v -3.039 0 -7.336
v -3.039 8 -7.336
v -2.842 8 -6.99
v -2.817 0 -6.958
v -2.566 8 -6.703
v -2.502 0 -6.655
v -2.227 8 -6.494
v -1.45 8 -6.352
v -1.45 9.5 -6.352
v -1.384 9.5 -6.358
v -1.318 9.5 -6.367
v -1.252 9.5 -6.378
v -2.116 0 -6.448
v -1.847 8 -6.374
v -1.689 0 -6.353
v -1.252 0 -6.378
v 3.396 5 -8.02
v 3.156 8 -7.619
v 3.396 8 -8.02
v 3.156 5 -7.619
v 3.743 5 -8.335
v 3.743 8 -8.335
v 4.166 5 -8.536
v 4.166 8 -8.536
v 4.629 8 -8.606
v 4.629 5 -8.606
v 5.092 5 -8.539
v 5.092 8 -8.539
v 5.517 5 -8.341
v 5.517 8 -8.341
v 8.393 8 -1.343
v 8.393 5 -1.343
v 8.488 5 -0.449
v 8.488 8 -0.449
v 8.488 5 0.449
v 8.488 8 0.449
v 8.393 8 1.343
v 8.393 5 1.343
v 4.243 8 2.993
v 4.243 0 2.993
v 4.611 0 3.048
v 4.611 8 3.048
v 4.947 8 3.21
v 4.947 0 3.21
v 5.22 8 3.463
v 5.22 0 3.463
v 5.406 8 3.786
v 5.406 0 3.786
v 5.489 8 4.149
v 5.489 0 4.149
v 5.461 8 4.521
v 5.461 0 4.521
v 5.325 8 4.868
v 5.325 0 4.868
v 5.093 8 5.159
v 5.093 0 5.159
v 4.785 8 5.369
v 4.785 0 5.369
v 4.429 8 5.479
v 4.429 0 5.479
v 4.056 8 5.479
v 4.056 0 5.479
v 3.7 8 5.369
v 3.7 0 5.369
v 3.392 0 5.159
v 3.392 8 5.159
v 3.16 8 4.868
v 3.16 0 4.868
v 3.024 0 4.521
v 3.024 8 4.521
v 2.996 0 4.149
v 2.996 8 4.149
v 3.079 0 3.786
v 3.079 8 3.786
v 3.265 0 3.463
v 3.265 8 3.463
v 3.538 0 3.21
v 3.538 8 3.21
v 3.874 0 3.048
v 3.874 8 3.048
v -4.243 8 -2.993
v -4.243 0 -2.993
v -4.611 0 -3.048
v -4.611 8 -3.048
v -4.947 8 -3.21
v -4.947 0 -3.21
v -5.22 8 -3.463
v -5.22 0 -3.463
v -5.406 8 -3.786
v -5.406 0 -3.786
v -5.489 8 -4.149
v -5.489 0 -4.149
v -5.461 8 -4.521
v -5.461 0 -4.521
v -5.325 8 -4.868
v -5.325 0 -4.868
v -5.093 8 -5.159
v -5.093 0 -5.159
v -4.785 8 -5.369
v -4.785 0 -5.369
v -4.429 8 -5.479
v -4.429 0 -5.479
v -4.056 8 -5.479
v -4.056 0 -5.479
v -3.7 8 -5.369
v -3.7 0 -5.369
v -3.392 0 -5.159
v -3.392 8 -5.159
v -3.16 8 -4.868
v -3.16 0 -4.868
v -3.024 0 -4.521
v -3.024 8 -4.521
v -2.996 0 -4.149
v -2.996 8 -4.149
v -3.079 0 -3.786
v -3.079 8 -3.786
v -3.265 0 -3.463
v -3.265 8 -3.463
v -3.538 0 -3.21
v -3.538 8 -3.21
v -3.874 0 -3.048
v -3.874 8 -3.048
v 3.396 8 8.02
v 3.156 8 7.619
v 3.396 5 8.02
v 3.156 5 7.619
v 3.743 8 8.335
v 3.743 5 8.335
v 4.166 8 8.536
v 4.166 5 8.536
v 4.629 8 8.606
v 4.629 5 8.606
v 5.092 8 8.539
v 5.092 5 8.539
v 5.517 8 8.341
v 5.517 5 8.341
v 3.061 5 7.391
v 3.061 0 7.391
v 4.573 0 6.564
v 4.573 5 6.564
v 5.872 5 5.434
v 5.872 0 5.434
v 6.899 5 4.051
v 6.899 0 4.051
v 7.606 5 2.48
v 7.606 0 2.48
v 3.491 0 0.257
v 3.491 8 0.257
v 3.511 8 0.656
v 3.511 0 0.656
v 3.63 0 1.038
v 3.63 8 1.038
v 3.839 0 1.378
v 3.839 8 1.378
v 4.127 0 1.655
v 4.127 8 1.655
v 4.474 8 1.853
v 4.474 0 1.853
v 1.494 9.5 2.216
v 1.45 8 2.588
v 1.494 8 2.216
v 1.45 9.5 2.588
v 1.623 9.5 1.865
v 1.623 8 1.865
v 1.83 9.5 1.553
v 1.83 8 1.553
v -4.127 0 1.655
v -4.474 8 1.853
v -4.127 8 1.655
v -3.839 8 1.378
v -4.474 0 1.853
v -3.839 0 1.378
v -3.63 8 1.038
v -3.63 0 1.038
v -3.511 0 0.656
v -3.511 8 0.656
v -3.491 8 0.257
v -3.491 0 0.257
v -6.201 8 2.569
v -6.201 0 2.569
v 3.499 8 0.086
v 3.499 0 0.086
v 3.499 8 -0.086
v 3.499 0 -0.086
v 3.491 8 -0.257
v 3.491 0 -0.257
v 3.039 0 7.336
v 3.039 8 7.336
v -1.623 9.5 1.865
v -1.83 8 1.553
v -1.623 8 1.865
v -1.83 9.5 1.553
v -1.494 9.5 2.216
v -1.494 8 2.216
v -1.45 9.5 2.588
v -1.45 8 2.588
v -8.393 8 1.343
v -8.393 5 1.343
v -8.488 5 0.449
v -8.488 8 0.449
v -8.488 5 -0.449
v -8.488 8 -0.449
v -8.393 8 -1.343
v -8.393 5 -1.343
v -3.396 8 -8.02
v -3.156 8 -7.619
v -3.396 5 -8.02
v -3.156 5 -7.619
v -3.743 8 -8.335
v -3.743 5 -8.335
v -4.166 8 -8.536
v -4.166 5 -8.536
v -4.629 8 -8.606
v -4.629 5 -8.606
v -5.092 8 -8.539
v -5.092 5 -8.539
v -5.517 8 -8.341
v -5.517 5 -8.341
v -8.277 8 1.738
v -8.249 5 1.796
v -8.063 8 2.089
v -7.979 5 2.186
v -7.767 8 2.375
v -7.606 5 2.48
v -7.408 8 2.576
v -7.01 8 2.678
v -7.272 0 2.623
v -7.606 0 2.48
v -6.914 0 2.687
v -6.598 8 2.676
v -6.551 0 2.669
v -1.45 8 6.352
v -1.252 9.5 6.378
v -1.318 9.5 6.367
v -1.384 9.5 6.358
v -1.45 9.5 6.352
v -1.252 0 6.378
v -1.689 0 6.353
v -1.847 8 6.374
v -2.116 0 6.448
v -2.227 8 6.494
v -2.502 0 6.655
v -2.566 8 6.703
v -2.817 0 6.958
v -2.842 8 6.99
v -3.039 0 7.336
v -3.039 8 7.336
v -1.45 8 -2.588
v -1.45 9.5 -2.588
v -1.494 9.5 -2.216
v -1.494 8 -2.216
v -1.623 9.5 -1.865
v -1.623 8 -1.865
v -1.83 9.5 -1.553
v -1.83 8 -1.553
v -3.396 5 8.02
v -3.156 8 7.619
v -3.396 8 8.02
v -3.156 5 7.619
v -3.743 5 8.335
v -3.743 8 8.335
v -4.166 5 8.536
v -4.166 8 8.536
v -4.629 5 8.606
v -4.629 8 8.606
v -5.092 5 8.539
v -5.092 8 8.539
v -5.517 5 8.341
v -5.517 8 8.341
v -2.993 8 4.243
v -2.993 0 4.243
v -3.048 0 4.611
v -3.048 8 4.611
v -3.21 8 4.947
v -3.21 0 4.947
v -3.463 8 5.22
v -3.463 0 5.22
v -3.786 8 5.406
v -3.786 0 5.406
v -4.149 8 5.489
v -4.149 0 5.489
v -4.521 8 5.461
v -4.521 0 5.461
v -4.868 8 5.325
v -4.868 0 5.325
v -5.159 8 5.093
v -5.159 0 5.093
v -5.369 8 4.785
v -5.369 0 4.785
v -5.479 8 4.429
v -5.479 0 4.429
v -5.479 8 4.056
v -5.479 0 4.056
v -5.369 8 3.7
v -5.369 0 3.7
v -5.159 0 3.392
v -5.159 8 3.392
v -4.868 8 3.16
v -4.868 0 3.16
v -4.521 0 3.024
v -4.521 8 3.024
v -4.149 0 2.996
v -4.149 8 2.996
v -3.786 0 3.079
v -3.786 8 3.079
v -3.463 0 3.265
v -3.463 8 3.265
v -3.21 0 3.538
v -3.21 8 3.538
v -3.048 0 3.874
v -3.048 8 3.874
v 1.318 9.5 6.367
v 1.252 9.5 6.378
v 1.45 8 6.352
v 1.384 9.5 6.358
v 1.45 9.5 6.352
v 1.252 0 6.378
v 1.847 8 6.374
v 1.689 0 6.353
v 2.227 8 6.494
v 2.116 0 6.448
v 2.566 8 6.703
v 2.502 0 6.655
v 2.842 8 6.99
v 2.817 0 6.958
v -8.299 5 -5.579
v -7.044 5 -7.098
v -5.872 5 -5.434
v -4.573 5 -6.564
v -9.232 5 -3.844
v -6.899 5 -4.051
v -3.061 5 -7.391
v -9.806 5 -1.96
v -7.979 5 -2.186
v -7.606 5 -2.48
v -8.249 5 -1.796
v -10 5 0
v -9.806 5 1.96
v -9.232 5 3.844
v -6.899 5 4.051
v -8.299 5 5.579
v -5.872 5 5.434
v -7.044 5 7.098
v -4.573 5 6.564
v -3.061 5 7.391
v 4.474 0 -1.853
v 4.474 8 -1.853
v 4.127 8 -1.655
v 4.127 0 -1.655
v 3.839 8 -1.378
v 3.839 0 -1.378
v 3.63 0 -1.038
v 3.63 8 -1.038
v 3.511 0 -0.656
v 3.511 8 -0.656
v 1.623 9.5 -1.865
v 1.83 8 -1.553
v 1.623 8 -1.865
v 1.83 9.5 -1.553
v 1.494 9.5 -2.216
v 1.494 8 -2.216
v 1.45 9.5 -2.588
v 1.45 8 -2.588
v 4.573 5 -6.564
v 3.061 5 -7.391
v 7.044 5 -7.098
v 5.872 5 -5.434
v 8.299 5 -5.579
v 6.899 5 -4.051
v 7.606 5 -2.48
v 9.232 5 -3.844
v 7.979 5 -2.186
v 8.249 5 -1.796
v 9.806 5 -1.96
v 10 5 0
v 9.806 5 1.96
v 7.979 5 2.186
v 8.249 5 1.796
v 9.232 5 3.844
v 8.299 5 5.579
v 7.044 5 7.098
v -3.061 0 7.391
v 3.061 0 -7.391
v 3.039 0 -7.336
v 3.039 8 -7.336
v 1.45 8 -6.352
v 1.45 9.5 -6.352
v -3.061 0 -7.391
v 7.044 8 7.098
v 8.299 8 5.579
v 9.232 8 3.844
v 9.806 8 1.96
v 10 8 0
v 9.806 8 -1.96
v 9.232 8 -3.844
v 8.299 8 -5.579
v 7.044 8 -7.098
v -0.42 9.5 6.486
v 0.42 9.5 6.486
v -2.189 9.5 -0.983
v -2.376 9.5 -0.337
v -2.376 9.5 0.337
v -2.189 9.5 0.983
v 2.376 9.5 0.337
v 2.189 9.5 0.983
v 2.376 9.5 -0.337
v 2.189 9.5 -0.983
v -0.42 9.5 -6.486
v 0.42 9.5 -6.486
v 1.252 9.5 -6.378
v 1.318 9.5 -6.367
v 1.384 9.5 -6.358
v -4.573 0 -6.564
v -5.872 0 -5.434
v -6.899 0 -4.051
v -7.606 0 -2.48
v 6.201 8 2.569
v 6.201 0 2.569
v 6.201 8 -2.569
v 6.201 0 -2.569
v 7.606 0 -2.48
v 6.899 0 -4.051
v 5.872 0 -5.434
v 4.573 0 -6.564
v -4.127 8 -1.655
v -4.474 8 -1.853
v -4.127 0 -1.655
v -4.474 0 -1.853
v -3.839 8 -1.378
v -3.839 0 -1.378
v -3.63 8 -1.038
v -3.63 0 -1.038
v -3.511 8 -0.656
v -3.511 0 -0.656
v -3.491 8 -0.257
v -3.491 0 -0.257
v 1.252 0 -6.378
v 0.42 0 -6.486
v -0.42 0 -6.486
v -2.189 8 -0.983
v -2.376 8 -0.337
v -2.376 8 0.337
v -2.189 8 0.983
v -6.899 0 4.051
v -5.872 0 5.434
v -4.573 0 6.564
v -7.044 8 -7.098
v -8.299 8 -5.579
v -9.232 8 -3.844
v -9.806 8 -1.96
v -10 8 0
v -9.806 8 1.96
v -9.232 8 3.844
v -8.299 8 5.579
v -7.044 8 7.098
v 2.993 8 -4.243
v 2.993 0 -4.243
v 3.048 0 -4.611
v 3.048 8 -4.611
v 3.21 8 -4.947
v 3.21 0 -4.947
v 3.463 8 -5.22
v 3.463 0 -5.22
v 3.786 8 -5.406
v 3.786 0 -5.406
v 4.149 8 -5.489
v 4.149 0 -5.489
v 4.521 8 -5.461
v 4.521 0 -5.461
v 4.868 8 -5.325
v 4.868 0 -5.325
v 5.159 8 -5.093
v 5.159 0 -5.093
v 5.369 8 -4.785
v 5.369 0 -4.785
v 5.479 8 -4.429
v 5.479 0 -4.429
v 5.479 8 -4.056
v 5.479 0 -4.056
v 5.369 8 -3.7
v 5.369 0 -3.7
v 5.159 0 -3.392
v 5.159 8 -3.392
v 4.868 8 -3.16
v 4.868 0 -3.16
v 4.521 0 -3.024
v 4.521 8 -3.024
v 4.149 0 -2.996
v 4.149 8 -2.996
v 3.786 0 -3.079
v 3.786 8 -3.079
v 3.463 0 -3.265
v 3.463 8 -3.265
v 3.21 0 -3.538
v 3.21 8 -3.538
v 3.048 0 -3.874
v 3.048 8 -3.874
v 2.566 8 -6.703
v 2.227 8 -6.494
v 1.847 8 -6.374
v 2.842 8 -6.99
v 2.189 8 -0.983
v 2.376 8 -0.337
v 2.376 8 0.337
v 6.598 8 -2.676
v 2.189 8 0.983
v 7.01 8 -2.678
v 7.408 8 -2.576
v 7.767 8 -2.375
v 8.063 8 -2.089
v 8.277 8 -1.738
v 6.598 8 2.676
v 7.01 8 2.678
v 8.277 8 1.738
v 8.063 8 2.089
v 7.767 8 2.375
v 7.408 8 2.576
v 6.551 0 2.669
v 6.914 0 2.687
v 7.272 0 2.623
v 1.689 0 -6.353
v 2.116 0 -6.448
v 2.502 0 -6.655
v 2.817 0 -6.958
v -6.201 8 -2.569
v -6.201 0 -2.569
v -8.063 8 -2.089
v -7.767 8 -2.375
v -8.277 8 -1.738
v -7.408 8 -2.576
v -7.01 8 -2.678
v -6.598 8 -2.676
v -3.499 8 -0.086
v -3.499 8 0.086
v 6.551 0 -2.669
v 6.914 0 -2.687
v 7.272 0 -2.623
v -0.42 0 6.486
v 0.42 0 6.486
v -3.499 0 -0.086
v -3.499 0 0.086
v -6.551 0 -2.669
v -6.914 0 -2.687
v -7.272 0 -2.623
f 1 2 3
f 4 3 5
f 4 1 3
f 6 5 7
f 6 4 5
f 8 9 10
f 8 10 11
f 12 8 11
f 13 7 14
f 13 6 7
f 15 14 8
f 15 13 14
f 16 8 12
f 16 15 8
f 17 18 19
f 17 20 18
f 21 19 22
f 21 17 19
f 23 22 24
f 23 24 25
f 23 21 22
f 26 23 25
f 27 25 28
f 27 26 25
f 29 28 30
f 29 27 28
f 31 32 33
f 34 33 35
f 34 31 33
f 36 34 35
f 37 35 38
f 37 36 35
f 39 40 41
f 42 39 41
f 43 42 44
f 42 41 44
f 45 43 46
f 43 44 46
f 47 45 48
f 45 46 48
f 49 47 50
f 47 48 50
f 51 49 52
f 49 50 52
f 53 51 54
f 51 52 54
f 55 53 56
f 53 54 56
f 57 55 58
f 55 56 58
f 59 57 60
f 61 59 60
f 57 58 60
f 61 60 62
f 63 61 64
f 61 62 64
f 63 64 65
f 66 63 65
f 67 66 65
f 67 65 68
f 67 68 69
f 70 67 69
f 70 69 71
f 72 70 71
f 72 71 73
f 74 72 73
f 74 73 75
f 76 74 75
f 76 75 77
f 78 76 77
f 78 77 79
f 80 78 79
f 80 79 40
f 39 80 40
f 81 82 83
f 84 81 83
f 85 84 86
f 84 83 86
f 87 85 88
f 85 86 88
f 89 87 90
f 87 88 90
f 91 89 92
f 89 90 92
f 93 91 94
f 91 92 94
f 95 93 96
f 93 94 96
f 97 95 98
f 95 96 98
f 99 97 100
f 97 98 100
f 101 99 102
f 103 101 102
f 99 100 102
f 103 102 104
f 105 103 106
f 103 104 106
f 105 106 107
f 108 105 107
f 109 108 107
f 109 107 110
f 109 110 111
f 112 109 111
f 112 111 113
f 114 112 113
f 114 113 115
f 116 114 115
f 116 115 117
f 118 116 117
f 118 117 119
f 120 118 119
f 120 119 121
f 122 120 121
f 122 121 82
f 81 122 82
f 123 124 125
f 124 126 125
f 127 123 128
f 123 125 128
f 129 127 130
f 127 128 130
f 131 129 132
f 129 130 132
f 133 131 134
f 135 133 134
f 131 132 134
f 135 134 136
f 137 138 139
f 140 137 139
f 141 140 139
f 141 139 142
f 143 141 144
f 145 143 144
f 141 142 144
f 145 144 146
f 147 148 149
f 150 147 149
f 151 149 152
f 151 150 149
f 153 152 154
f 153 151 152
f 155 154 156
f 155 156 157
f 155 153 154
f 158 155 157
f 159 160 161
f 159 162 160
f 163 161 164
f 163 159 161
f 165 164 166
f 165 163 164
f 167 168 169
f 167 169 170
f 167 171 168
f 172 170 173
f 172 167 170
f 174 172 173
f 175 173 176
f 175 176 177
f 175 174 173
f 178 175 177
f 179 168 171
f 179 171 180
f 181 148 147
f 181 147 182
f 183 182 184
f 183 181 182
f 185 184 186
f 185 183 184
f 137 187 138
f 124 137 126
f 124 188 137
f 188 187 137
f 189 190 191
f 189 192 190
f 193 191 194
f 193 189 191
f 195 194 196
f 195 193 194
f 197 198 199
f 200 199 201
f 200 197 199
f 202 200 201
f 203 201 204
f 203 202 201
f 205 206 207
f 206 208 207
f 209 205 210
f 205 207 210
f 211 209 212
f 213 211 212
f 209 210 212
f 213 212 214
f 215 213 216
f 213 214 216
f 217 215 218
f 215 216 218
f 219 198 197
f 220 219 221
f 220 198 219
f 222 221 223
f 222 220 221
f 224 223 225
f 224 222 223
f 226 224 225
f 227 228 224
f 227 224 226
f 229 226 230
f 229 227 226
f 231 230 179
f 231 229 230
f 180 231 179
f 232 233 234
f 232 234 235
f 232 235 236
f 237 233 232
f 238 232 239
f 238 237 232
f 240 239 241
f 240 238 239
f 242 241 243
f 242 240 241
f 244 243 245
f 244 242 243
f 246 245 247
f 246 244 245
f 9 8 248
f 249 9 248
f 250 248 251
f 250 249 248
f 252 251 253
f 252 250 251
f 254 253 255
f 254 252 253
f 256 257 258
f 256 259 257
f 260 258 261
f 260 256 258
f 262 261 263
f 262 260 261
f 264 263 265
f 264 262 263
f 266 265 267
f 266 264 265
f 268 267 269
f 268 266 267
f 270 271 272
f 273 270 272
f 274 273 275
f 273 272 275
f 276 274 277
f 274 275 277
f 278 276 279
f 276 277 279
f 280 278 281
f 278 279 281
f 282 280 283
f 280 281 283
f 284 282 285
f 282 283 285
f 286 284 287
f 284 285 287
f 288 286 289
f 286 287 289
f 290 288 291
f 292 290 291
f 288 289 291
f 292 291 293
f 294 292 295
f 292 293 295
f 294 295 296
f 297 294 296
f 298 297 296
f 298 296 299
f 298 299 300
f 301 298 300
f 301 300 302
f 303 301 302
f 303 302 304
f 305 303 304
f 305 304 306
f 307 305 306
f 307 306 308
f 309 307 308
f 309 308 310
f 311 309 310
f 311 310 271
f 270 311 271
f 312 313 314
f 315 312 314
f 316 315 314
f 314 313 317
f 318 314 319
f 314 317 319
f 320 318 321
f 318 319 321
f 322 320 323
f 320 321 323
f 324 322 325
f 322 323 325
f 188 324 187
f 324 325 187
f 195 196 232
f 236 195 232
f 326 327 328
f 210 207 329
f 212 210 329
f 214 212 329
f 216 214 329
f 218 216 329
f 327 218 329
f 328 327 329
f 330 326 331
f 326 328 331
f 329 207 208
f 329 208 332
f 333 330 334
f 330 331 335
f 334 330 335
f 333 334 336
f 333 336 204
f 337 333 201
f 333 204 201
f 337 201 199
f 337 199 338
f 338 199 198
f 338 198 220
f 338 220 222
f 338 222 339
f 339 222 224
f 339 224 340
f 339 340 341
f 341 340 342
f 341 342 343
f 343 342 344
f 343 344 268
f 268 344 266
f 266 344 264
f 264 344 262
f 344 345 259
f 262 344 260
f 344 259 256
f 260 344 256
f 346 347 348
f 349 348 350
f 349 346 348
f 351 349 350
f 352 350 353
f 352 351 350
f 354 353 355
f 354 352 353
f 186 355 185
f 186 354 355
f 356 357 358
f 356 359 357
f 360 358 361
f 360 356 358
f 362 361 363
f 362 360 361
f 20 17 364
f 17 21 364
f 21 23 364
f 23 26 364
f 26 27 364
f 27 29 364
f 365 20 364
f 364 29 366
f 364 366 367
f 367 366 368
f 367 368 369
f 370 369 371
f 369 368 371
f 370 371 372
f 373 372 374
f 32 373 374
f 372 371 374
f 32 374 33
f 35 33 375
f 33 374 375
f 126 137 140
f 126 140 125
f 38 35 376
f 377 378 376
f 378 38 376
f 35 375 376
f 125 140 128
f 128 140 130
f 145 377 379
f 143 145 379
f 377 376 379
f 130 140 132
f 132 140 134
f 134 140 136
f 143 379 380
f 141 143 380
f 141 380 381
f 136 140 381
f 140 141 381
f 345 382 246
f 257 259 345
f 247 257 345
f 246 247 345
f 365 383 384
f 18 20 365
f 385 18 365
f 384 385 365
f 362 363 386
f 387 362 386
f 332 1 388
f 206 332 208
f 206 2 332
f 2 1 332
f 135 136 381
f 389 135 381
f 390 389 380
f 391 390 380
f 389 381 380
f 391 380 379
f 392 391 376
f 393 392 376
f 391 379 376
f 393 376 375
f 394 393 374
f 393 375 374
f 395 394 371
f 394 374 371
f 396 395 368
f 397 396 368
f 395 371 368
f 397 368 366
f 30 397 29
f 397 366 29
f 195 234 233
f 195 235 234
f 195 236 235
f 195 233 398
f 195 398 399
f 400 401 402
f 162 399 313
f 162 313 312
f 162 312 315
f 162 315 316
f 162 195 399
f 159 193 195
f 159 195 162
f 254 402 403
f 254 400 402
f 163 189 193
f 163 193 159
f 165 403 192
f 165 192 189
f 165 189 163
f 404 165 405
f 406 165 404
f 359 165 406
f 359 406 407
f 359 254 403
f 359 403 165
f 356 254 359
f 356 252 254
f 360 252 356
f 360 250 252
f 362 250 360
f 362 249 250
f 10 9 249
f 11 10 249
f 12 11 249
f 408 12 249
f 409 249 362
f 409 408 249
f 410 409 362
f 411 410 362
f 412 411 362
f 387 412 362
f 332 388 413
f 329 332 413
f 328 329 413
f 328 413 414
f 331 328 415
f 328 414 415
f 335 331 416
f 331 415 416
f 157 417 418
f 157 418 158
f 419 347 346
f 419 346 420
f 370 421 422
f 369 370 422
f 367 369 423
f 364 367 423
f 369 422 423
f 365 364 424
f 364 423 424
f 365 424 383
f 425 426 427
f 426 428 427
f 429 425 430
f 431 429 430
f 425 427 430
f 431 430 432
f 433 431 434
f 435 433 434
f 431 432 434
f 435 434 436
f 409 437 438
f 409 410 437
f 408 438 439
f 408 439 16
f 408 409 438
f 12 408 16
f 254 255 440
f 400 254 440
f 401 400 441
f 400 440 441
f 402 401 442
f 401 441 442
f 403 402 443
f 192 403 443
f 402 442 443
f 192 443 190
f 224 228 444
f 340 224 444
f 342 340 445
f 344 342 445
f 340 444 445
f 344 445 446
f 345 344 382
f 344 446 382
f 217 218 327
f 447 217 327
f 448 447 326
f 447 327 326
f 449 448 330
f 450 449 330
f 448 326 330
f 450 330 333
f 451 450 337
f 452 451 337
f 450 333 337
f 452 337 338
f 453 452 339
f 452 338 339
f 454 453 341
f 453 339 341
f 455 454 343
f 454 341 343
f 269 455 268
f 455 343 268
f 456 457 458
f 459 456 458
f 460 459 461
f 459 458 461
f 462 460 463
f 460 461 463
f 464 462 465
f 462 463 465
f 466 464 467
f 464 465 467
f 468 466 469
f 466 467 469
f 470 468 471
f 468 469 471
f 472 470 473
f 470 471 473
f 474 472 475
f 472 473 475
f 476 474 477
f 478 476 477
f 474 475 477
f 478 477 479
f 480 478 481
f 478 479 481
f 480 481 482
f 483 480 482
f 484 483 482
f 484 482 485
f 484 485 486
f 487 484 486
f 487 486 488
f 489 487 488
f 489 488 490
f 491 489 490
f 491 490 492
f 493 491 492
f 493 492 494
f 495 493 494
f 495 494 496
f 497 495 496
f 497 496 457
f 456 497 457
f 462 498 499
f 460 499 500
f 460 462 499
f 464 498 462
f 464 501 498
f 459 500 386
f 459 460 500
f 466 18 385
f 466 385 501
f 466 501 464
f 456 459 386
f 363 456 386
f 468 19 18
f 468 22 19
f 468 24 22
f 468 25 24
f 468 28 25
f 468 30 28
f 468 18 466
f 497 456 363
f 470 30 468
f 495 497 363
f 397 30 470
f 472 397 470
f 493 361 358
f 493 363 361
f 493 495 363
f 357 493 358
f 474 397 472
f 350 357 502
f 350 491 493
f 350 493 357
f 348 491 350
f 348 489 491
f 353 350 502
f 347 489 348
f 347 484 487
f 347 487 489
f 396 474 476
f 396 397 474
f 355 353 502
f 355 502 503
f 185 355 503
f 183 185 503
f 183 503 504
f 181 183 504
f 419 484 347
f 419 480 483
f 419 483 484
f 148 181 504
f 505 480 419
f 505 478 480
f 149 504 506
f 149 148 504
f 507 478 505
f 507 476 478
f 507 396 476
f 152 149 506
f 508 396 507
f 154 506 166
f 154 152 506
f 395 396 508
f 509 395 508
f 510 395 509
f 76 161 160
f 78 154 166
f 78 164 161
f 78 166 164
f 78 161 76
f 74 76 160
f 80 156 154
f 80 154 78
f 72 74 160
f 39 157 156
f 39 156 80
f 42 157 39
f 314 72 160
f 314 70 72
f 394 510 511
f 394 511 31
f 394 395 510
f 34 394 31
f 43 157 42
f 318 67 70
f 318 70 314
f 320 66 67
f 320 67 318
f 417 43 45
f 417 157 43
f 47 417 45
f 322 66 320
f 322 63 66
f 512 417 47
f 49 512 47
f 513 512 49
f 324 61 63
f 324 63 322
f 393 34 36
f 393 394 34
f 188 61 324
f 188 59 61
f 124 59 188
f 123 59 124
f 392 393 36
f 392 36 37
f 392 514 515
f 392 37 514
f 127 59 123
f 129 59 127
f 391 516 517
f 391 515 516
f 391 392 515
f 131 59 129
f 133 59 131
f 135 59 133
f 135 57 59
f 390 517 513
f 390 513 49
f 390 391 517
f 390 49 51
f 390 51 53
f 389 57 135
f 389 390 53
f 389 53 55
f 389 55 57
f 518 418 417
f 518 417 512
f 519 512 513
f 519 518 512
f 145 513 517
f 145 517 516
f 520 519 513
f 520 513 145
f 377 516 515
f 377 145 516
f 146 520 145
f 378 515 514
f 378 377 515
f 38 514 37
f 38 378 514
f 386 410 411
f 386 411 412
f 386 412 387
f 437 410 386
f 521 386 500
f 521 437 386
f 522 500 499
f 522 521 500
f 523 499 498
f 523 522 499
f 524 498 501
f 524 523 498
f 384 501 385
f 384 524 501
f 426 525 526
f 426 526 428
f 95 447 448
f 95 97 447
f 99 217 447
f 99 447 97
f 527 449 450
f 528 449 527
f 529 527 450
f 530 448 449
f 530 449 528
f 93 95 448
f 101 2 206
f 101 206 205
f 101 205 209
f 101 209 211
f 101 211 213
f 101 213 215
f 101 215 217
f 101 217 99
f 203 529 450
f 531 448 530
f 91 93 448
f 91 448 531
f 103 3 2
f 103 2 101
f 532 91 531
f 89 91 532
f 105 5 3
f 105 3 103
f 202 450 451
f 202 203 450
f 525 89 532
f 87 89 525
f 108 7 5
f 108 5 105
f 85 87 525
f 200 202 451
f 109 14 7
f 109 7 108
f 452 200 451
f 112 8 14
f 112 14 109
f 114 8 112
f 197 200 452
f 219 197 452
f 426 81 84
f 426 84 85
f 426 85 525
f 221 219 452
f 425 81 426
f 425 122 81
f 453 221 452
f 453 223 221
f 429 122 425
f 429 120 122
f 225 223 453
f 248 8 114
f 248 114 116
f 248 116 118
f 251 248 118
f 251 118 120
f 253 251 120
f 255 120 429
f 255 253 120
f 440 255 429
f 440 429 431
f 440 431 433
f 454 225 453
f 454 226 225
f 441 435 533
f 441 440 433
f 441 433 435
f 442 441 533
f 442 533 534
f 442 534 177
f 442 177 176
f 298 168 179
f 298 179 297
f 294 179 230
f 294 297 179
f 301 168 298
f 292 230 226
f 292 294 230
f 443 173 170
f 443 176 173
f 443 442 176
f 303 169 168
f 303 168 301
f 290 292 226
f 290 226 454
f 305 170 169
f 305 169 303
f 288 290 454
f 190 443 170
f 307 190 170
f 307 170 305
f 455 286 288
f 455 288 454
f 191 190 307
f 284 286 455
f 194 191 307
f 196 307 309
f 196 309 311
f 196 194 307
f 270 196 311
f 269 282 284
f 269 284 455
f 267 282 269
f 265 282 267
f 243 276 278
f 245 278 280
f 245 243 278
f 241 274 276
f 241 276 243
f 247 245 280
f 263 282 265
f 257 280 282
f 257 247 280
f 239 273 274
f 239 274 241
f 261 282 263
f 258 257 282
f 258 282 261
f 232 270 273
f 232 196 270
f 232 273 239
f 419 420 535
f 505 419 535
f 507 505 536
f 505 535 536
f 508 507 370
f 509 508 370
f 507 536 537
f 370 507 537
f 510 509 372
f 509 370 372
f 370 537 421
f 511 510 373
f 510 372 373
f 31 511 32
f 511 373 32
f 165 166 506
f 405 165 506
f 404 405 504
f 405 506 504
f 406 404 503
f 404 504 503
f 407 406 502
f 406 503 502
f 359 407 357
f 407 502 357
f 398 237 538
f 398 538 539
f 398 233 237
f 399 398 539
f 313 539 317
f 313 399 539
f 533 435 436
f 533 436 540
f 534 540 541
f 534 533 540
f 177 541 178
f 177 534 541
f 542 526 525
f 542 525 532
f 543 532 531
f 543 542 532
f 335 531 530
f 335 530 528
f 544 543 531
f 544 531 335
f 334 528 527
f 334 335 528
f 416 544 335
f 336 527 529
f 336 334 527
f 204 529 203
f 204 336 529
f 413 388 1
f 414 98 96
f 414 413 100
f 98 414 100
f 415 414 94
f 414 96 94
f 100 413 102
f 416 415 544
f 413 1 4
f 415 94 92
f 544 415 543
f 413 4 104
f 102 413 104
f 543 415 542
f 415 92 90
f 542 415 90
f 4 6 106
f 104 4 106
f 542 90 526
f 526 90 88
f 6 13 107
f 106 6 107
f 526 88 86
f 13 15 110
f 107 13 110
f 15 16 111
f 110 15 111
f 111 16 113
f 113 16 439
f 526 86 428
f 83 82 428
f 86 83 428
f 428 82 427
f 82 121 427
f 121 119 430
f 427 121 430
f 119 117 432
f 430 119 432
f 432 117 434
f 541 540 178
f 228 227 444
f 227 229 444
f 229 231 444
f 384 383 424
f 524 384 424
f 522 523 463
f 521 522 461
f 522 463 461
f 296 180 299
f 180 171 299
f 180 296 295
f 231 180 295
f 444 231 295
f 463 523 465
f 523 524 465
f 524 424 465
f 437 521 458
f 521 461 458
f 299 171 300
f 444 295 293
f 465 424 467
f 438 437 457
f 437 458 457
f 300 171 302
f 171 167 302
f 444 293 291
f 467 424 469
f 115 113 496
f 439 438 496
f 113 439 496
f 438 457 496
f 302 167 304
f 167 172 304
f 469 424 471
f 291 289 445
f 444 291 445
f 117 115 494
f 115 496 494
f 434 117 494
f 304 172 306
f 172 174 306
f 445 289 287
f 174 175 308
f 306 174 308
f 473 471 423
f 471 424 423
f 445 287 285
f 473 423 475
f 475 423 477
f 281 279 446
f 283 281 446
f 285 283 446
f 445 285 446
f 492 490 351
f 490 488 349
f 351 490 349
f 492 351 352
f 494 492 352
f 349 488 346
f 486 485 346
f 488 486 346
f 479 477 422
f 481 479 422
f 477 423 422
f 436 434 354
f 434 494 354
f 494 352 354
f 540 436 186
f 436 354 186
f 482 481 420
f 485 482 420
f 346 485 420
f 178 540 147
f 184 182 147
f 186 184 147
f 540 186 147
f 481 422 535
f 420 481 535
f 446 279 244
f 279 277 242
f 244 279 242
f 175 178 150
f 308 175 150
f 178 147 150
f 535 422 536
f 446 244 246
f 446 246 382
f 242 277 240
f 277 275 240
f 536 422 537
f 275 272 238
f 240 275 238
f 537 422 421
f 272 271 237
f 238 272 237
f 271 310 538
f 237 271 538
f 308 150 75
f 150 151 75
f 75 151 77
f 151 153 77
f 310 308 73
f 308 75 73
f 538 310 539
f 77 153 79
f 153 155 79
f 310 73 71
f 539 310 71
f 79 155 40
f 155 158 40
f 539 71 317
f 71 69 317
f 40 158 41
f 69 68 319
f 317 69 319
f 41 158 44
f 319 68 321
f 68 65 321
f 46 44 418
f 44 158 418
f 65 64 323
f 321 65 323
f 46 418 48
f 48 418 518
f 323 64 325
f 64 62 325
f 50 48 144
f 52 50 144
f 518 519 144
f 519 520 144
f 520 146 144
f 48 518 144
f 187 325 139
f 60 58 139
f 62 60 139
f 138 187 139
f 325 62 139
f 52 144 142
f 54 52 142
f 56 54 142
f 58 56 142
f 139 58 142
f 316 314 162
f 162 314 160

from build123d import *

# Parameters (mm, degrees)
SKETCH1_R                = 10
BOSS_EXTRUDE1_DEPTH      = 8
BOSS_EXTRUDE2_DEPTH      = 1.5
FILLET1_R                = 1.6
SKETCH5_R                = 10
SKETCH5_R_2              = 8
CUT_EXTRUDE1_DEPTH       = 5
CUT_EXTRUDE2_REACH       = 19.037
SKETCH6_R                = 1.2500000000000002
CIRPATTERN1_COUNT        = 4
CUT_EXTRUDE3_DEPTH       = 17.24807680927192
FILLET2_R                = 1.6
CIRPATTERN2_COUNT        = 2
FILLET2_OF_CIRPATTERN2_R = 1.6


with BuildPart() as part:
    # Sketch1 → Boss-Extrude1 (new body)
    with BuildSketch(Plane(origin=(0, 0, 0), x_dir=(1, 0, 0), z_dir=(0, 1, 0))):
        with Locations(Location((0, 0, 0), (0, 0, 270))):
            Circle(SKETCH1_R)
    extrude(amount=BOSS_EXTRUDE1_DEPTH)

    # Sketch4 → Boss-Extrude2 (add)
    with BuildSketch(Plane(origin=(0, 8, 0), x_dir=(1, 0, 0), z_dir=(0, 1, 0))):
        with BuildLine():
            Line((-1.449999999999999, 6.336205489092031), (-1.45, 1.9124591498905275))
            ThreePointArc((-1.45, 1.9124591498905275), (-2.4, 2.9e-16), (-1.45, -1.9124591498905275))
            Line((-1.45, -1.9124591498905275), (-1.449999999999999, -6.336205489092031))
            ThreePointArc((-1.449999999999999, -6.336205489092031), (4e-16, -6.499999999999999), (1.449999999999999, -6.336205489092031))
            Line((1.449999999999999, -6.336205489092031), (1.45, -1.9124591498905275))
            ThreePointArc((1.45, -1.9124591498905275), (2.4, 0), (1.45, 1.9124591498905275))
            Line((1.45, 1.9124591498905275), (1.449999999999999, 6.336205489092031))
            ThreePointArc((1.449999999999999, 6.336205489092031), (4e-16, 6.499999999999999), (-1.449999999999999, 6.336205489092031))
        make_face()
    extrude(amount=BOSS_EXTRUDE2_DEPTH)

    # Fillet1
    fillet1_edges = [part.edges().sort_by_distance(p)[0] for p in [
        (-1.4500000000000002, 8.75, -1.9124591498905277),
        (-1.4500000000000002, 8.75, 1.9124591498905277),
        (1.4500000000000002, 8.75, 1.9124591498905277),
        (1.4500000000000002, 8.75, -1.9124591498905277),
    ]]
    fillet(fillet1_edges, radius=FILLET1_R)

    # Sketch5 → Cut-Extrude1 (cut)
    with BuildSketch(Plane(origin=(0, 0, 0), x_dir=(1, 0, 0), z_dir=(0, 1, 0))):
        with Locations(Location((0, 0, 0), (0, 0, 270))):
            Circle(SKETCH5_R)
        with Locations(Location((0, 0, 0), (0, 0, 90))):
            Circle(SKETCH5_R_2, mode=Mode.SUBTRACT)
    extrude(amount=CUT_EXTRUDE1_DEPTH, mode=Mode.SUBTRACT)

    # Sketch6 → Cut-Extrude2 (cut, up to next)
    with BuildSketch(Plane.XZ, mode=Mode.PRIVATE) as cut_extrude2_sk1:
        with Locations(Location((4.242640687119277, 4.242640687119293, 0), (0, 0, 270))):
            Circle(SKETCH6_R)
    cut_extrude2_tool1 = extrude(cut_extrude2_sk1.sketch, amount=-CUT_EXTRUDE2_REACH, mode=Mode.PRIVATE) & part.part
    cut_extrude2 = cut_extrude2_tool1.solids().sort_by_distance((4.242641, 0, 4.242641))[0]
    add(cut_extrude2, mode=Mode.SUBTRACT)

    # CirPattern1: Cut-Extrude2 ×4 about axis
    cirpattern1_axis = Axis((7.37e-15, 0, -7.37e-15), (0, 1, 0))
    for i in range(1, CIRPATTERN1_COUNT):
        add(cut_extrude2.rotate(cirpattern1_axis, i * 360 / CIRPATTERN1_COUNT), mode=Mode.SUBTRACT)

    # Sketch7 → Cut-Extrude3 (cut, through all)
    with BuildSketch(Plane(origin=(0, 8, 0), x_dir=(1, 0, 0), z_dir=(0, 1, 0))):
        with BuildLine():
            Line((-3.233578363789502, -1.3393920132778183), (-7.852976026345933, -3.2528091751032733))
            ThreePointArc((-7.852976026345933, -3.2528091751032733), (-8.5, -1.04e-15), (-7.852976026345933, 3.2528091751032733))
            Line((-7.852976026345933, 3.2528091751032733), (-3.233578363789502, 1.3393920132778183))
            ThreePointArc((-3.233578363789502, 1.3393920132778183), (-3.5, -4.3e-16), (-3.233578363789502, -1.3393920132778183))
        make_face()
        with BuildLine():
            Line((-2.487442310373089, 6.005216961323361), (-3.826834323650907, 9.238795325112864))
            ThreePointArc((-3.826834323650907, 9.238795325112864), (6.1e-16, 10), (3.826834323650907, 9.238795325112864))
            Line((3.826834323650907, 9.238795325112864), (2.487442310373089, 6.005216961323361))
            ThreePointArc((2.487442310373089, 6.005216961323361), (4e-16, 6.5), (-2.487442310373089, 6.005216961323361))
        make_face()
    cut_extrude3 = extrude(amount=-CUT_EXTRUDE3_DEPTH, mode=Mode.SUBTRACT)

    # Fillet2
    fillet2_edges = [part.edges().sort_by_distance(p)[0] for p in [
        (-7.852976026345933, 6.5, 3.2528091751032733),
        (-7.852976026345933, 6.5, -3.2528091751032733),
        (-3.233578363789502, 4, 1.3393920132778185),
        (-3.233578363789502, 4, -1.3393920132778183),
        (2.487442310373089, 4, -6.005216961323361),
        (-2.4874423103730887, 4, -6.005216961323361),
        (3.826834323650907, 6.5, -9.238795325112866),
        (-3.826834323650907, 6.5, -9.238795325112866),
    ]]
    fillet(fillet2_edges, radius=FILLET2_R)

    # CirPattern2: Cut-Extrude3 ×2 about axis
    cirpattern2_axis = Axis((-8.01e-15, 0, 6.38e-15), (0, 1, 0))
    for i in range(1, CIRPATTERN2_COUNT):
        add(cut_extrude3.rotate(cirpattern2_axis, i * 360 / CIRPATTERN2_COUNT), mode=Mode.SUBTRACT)

    # Fillet2 of CirPattern2
    fillet2_of_cirpattern2_edges = [part.edges().sort_by_distance(p)[0] for p in [
        (7.852976026345917, 6.5, -3.2528091751032595),
        (7.852976026345917, 6.5, 3.252809175103287),
        (3.233578363789486, 4, -1.3393920132778052),
        (3.233578363789486, 4, 1.3393920132778316),
        (-2.487442310373106, 4, 6.005216961323374),
        (2.487442310373072, 4, 6.005216961323374),
        (-3.826834323650924, 6.5, 9.238795325112878),
        (3.8268343236508895, 6.5, 9.238795325112878),
    ]]
    fillet(fillet2_of_cirpattern2_edges, radius=FILLET2_OF_CIRPATTERN2_R)


solid = part.part
